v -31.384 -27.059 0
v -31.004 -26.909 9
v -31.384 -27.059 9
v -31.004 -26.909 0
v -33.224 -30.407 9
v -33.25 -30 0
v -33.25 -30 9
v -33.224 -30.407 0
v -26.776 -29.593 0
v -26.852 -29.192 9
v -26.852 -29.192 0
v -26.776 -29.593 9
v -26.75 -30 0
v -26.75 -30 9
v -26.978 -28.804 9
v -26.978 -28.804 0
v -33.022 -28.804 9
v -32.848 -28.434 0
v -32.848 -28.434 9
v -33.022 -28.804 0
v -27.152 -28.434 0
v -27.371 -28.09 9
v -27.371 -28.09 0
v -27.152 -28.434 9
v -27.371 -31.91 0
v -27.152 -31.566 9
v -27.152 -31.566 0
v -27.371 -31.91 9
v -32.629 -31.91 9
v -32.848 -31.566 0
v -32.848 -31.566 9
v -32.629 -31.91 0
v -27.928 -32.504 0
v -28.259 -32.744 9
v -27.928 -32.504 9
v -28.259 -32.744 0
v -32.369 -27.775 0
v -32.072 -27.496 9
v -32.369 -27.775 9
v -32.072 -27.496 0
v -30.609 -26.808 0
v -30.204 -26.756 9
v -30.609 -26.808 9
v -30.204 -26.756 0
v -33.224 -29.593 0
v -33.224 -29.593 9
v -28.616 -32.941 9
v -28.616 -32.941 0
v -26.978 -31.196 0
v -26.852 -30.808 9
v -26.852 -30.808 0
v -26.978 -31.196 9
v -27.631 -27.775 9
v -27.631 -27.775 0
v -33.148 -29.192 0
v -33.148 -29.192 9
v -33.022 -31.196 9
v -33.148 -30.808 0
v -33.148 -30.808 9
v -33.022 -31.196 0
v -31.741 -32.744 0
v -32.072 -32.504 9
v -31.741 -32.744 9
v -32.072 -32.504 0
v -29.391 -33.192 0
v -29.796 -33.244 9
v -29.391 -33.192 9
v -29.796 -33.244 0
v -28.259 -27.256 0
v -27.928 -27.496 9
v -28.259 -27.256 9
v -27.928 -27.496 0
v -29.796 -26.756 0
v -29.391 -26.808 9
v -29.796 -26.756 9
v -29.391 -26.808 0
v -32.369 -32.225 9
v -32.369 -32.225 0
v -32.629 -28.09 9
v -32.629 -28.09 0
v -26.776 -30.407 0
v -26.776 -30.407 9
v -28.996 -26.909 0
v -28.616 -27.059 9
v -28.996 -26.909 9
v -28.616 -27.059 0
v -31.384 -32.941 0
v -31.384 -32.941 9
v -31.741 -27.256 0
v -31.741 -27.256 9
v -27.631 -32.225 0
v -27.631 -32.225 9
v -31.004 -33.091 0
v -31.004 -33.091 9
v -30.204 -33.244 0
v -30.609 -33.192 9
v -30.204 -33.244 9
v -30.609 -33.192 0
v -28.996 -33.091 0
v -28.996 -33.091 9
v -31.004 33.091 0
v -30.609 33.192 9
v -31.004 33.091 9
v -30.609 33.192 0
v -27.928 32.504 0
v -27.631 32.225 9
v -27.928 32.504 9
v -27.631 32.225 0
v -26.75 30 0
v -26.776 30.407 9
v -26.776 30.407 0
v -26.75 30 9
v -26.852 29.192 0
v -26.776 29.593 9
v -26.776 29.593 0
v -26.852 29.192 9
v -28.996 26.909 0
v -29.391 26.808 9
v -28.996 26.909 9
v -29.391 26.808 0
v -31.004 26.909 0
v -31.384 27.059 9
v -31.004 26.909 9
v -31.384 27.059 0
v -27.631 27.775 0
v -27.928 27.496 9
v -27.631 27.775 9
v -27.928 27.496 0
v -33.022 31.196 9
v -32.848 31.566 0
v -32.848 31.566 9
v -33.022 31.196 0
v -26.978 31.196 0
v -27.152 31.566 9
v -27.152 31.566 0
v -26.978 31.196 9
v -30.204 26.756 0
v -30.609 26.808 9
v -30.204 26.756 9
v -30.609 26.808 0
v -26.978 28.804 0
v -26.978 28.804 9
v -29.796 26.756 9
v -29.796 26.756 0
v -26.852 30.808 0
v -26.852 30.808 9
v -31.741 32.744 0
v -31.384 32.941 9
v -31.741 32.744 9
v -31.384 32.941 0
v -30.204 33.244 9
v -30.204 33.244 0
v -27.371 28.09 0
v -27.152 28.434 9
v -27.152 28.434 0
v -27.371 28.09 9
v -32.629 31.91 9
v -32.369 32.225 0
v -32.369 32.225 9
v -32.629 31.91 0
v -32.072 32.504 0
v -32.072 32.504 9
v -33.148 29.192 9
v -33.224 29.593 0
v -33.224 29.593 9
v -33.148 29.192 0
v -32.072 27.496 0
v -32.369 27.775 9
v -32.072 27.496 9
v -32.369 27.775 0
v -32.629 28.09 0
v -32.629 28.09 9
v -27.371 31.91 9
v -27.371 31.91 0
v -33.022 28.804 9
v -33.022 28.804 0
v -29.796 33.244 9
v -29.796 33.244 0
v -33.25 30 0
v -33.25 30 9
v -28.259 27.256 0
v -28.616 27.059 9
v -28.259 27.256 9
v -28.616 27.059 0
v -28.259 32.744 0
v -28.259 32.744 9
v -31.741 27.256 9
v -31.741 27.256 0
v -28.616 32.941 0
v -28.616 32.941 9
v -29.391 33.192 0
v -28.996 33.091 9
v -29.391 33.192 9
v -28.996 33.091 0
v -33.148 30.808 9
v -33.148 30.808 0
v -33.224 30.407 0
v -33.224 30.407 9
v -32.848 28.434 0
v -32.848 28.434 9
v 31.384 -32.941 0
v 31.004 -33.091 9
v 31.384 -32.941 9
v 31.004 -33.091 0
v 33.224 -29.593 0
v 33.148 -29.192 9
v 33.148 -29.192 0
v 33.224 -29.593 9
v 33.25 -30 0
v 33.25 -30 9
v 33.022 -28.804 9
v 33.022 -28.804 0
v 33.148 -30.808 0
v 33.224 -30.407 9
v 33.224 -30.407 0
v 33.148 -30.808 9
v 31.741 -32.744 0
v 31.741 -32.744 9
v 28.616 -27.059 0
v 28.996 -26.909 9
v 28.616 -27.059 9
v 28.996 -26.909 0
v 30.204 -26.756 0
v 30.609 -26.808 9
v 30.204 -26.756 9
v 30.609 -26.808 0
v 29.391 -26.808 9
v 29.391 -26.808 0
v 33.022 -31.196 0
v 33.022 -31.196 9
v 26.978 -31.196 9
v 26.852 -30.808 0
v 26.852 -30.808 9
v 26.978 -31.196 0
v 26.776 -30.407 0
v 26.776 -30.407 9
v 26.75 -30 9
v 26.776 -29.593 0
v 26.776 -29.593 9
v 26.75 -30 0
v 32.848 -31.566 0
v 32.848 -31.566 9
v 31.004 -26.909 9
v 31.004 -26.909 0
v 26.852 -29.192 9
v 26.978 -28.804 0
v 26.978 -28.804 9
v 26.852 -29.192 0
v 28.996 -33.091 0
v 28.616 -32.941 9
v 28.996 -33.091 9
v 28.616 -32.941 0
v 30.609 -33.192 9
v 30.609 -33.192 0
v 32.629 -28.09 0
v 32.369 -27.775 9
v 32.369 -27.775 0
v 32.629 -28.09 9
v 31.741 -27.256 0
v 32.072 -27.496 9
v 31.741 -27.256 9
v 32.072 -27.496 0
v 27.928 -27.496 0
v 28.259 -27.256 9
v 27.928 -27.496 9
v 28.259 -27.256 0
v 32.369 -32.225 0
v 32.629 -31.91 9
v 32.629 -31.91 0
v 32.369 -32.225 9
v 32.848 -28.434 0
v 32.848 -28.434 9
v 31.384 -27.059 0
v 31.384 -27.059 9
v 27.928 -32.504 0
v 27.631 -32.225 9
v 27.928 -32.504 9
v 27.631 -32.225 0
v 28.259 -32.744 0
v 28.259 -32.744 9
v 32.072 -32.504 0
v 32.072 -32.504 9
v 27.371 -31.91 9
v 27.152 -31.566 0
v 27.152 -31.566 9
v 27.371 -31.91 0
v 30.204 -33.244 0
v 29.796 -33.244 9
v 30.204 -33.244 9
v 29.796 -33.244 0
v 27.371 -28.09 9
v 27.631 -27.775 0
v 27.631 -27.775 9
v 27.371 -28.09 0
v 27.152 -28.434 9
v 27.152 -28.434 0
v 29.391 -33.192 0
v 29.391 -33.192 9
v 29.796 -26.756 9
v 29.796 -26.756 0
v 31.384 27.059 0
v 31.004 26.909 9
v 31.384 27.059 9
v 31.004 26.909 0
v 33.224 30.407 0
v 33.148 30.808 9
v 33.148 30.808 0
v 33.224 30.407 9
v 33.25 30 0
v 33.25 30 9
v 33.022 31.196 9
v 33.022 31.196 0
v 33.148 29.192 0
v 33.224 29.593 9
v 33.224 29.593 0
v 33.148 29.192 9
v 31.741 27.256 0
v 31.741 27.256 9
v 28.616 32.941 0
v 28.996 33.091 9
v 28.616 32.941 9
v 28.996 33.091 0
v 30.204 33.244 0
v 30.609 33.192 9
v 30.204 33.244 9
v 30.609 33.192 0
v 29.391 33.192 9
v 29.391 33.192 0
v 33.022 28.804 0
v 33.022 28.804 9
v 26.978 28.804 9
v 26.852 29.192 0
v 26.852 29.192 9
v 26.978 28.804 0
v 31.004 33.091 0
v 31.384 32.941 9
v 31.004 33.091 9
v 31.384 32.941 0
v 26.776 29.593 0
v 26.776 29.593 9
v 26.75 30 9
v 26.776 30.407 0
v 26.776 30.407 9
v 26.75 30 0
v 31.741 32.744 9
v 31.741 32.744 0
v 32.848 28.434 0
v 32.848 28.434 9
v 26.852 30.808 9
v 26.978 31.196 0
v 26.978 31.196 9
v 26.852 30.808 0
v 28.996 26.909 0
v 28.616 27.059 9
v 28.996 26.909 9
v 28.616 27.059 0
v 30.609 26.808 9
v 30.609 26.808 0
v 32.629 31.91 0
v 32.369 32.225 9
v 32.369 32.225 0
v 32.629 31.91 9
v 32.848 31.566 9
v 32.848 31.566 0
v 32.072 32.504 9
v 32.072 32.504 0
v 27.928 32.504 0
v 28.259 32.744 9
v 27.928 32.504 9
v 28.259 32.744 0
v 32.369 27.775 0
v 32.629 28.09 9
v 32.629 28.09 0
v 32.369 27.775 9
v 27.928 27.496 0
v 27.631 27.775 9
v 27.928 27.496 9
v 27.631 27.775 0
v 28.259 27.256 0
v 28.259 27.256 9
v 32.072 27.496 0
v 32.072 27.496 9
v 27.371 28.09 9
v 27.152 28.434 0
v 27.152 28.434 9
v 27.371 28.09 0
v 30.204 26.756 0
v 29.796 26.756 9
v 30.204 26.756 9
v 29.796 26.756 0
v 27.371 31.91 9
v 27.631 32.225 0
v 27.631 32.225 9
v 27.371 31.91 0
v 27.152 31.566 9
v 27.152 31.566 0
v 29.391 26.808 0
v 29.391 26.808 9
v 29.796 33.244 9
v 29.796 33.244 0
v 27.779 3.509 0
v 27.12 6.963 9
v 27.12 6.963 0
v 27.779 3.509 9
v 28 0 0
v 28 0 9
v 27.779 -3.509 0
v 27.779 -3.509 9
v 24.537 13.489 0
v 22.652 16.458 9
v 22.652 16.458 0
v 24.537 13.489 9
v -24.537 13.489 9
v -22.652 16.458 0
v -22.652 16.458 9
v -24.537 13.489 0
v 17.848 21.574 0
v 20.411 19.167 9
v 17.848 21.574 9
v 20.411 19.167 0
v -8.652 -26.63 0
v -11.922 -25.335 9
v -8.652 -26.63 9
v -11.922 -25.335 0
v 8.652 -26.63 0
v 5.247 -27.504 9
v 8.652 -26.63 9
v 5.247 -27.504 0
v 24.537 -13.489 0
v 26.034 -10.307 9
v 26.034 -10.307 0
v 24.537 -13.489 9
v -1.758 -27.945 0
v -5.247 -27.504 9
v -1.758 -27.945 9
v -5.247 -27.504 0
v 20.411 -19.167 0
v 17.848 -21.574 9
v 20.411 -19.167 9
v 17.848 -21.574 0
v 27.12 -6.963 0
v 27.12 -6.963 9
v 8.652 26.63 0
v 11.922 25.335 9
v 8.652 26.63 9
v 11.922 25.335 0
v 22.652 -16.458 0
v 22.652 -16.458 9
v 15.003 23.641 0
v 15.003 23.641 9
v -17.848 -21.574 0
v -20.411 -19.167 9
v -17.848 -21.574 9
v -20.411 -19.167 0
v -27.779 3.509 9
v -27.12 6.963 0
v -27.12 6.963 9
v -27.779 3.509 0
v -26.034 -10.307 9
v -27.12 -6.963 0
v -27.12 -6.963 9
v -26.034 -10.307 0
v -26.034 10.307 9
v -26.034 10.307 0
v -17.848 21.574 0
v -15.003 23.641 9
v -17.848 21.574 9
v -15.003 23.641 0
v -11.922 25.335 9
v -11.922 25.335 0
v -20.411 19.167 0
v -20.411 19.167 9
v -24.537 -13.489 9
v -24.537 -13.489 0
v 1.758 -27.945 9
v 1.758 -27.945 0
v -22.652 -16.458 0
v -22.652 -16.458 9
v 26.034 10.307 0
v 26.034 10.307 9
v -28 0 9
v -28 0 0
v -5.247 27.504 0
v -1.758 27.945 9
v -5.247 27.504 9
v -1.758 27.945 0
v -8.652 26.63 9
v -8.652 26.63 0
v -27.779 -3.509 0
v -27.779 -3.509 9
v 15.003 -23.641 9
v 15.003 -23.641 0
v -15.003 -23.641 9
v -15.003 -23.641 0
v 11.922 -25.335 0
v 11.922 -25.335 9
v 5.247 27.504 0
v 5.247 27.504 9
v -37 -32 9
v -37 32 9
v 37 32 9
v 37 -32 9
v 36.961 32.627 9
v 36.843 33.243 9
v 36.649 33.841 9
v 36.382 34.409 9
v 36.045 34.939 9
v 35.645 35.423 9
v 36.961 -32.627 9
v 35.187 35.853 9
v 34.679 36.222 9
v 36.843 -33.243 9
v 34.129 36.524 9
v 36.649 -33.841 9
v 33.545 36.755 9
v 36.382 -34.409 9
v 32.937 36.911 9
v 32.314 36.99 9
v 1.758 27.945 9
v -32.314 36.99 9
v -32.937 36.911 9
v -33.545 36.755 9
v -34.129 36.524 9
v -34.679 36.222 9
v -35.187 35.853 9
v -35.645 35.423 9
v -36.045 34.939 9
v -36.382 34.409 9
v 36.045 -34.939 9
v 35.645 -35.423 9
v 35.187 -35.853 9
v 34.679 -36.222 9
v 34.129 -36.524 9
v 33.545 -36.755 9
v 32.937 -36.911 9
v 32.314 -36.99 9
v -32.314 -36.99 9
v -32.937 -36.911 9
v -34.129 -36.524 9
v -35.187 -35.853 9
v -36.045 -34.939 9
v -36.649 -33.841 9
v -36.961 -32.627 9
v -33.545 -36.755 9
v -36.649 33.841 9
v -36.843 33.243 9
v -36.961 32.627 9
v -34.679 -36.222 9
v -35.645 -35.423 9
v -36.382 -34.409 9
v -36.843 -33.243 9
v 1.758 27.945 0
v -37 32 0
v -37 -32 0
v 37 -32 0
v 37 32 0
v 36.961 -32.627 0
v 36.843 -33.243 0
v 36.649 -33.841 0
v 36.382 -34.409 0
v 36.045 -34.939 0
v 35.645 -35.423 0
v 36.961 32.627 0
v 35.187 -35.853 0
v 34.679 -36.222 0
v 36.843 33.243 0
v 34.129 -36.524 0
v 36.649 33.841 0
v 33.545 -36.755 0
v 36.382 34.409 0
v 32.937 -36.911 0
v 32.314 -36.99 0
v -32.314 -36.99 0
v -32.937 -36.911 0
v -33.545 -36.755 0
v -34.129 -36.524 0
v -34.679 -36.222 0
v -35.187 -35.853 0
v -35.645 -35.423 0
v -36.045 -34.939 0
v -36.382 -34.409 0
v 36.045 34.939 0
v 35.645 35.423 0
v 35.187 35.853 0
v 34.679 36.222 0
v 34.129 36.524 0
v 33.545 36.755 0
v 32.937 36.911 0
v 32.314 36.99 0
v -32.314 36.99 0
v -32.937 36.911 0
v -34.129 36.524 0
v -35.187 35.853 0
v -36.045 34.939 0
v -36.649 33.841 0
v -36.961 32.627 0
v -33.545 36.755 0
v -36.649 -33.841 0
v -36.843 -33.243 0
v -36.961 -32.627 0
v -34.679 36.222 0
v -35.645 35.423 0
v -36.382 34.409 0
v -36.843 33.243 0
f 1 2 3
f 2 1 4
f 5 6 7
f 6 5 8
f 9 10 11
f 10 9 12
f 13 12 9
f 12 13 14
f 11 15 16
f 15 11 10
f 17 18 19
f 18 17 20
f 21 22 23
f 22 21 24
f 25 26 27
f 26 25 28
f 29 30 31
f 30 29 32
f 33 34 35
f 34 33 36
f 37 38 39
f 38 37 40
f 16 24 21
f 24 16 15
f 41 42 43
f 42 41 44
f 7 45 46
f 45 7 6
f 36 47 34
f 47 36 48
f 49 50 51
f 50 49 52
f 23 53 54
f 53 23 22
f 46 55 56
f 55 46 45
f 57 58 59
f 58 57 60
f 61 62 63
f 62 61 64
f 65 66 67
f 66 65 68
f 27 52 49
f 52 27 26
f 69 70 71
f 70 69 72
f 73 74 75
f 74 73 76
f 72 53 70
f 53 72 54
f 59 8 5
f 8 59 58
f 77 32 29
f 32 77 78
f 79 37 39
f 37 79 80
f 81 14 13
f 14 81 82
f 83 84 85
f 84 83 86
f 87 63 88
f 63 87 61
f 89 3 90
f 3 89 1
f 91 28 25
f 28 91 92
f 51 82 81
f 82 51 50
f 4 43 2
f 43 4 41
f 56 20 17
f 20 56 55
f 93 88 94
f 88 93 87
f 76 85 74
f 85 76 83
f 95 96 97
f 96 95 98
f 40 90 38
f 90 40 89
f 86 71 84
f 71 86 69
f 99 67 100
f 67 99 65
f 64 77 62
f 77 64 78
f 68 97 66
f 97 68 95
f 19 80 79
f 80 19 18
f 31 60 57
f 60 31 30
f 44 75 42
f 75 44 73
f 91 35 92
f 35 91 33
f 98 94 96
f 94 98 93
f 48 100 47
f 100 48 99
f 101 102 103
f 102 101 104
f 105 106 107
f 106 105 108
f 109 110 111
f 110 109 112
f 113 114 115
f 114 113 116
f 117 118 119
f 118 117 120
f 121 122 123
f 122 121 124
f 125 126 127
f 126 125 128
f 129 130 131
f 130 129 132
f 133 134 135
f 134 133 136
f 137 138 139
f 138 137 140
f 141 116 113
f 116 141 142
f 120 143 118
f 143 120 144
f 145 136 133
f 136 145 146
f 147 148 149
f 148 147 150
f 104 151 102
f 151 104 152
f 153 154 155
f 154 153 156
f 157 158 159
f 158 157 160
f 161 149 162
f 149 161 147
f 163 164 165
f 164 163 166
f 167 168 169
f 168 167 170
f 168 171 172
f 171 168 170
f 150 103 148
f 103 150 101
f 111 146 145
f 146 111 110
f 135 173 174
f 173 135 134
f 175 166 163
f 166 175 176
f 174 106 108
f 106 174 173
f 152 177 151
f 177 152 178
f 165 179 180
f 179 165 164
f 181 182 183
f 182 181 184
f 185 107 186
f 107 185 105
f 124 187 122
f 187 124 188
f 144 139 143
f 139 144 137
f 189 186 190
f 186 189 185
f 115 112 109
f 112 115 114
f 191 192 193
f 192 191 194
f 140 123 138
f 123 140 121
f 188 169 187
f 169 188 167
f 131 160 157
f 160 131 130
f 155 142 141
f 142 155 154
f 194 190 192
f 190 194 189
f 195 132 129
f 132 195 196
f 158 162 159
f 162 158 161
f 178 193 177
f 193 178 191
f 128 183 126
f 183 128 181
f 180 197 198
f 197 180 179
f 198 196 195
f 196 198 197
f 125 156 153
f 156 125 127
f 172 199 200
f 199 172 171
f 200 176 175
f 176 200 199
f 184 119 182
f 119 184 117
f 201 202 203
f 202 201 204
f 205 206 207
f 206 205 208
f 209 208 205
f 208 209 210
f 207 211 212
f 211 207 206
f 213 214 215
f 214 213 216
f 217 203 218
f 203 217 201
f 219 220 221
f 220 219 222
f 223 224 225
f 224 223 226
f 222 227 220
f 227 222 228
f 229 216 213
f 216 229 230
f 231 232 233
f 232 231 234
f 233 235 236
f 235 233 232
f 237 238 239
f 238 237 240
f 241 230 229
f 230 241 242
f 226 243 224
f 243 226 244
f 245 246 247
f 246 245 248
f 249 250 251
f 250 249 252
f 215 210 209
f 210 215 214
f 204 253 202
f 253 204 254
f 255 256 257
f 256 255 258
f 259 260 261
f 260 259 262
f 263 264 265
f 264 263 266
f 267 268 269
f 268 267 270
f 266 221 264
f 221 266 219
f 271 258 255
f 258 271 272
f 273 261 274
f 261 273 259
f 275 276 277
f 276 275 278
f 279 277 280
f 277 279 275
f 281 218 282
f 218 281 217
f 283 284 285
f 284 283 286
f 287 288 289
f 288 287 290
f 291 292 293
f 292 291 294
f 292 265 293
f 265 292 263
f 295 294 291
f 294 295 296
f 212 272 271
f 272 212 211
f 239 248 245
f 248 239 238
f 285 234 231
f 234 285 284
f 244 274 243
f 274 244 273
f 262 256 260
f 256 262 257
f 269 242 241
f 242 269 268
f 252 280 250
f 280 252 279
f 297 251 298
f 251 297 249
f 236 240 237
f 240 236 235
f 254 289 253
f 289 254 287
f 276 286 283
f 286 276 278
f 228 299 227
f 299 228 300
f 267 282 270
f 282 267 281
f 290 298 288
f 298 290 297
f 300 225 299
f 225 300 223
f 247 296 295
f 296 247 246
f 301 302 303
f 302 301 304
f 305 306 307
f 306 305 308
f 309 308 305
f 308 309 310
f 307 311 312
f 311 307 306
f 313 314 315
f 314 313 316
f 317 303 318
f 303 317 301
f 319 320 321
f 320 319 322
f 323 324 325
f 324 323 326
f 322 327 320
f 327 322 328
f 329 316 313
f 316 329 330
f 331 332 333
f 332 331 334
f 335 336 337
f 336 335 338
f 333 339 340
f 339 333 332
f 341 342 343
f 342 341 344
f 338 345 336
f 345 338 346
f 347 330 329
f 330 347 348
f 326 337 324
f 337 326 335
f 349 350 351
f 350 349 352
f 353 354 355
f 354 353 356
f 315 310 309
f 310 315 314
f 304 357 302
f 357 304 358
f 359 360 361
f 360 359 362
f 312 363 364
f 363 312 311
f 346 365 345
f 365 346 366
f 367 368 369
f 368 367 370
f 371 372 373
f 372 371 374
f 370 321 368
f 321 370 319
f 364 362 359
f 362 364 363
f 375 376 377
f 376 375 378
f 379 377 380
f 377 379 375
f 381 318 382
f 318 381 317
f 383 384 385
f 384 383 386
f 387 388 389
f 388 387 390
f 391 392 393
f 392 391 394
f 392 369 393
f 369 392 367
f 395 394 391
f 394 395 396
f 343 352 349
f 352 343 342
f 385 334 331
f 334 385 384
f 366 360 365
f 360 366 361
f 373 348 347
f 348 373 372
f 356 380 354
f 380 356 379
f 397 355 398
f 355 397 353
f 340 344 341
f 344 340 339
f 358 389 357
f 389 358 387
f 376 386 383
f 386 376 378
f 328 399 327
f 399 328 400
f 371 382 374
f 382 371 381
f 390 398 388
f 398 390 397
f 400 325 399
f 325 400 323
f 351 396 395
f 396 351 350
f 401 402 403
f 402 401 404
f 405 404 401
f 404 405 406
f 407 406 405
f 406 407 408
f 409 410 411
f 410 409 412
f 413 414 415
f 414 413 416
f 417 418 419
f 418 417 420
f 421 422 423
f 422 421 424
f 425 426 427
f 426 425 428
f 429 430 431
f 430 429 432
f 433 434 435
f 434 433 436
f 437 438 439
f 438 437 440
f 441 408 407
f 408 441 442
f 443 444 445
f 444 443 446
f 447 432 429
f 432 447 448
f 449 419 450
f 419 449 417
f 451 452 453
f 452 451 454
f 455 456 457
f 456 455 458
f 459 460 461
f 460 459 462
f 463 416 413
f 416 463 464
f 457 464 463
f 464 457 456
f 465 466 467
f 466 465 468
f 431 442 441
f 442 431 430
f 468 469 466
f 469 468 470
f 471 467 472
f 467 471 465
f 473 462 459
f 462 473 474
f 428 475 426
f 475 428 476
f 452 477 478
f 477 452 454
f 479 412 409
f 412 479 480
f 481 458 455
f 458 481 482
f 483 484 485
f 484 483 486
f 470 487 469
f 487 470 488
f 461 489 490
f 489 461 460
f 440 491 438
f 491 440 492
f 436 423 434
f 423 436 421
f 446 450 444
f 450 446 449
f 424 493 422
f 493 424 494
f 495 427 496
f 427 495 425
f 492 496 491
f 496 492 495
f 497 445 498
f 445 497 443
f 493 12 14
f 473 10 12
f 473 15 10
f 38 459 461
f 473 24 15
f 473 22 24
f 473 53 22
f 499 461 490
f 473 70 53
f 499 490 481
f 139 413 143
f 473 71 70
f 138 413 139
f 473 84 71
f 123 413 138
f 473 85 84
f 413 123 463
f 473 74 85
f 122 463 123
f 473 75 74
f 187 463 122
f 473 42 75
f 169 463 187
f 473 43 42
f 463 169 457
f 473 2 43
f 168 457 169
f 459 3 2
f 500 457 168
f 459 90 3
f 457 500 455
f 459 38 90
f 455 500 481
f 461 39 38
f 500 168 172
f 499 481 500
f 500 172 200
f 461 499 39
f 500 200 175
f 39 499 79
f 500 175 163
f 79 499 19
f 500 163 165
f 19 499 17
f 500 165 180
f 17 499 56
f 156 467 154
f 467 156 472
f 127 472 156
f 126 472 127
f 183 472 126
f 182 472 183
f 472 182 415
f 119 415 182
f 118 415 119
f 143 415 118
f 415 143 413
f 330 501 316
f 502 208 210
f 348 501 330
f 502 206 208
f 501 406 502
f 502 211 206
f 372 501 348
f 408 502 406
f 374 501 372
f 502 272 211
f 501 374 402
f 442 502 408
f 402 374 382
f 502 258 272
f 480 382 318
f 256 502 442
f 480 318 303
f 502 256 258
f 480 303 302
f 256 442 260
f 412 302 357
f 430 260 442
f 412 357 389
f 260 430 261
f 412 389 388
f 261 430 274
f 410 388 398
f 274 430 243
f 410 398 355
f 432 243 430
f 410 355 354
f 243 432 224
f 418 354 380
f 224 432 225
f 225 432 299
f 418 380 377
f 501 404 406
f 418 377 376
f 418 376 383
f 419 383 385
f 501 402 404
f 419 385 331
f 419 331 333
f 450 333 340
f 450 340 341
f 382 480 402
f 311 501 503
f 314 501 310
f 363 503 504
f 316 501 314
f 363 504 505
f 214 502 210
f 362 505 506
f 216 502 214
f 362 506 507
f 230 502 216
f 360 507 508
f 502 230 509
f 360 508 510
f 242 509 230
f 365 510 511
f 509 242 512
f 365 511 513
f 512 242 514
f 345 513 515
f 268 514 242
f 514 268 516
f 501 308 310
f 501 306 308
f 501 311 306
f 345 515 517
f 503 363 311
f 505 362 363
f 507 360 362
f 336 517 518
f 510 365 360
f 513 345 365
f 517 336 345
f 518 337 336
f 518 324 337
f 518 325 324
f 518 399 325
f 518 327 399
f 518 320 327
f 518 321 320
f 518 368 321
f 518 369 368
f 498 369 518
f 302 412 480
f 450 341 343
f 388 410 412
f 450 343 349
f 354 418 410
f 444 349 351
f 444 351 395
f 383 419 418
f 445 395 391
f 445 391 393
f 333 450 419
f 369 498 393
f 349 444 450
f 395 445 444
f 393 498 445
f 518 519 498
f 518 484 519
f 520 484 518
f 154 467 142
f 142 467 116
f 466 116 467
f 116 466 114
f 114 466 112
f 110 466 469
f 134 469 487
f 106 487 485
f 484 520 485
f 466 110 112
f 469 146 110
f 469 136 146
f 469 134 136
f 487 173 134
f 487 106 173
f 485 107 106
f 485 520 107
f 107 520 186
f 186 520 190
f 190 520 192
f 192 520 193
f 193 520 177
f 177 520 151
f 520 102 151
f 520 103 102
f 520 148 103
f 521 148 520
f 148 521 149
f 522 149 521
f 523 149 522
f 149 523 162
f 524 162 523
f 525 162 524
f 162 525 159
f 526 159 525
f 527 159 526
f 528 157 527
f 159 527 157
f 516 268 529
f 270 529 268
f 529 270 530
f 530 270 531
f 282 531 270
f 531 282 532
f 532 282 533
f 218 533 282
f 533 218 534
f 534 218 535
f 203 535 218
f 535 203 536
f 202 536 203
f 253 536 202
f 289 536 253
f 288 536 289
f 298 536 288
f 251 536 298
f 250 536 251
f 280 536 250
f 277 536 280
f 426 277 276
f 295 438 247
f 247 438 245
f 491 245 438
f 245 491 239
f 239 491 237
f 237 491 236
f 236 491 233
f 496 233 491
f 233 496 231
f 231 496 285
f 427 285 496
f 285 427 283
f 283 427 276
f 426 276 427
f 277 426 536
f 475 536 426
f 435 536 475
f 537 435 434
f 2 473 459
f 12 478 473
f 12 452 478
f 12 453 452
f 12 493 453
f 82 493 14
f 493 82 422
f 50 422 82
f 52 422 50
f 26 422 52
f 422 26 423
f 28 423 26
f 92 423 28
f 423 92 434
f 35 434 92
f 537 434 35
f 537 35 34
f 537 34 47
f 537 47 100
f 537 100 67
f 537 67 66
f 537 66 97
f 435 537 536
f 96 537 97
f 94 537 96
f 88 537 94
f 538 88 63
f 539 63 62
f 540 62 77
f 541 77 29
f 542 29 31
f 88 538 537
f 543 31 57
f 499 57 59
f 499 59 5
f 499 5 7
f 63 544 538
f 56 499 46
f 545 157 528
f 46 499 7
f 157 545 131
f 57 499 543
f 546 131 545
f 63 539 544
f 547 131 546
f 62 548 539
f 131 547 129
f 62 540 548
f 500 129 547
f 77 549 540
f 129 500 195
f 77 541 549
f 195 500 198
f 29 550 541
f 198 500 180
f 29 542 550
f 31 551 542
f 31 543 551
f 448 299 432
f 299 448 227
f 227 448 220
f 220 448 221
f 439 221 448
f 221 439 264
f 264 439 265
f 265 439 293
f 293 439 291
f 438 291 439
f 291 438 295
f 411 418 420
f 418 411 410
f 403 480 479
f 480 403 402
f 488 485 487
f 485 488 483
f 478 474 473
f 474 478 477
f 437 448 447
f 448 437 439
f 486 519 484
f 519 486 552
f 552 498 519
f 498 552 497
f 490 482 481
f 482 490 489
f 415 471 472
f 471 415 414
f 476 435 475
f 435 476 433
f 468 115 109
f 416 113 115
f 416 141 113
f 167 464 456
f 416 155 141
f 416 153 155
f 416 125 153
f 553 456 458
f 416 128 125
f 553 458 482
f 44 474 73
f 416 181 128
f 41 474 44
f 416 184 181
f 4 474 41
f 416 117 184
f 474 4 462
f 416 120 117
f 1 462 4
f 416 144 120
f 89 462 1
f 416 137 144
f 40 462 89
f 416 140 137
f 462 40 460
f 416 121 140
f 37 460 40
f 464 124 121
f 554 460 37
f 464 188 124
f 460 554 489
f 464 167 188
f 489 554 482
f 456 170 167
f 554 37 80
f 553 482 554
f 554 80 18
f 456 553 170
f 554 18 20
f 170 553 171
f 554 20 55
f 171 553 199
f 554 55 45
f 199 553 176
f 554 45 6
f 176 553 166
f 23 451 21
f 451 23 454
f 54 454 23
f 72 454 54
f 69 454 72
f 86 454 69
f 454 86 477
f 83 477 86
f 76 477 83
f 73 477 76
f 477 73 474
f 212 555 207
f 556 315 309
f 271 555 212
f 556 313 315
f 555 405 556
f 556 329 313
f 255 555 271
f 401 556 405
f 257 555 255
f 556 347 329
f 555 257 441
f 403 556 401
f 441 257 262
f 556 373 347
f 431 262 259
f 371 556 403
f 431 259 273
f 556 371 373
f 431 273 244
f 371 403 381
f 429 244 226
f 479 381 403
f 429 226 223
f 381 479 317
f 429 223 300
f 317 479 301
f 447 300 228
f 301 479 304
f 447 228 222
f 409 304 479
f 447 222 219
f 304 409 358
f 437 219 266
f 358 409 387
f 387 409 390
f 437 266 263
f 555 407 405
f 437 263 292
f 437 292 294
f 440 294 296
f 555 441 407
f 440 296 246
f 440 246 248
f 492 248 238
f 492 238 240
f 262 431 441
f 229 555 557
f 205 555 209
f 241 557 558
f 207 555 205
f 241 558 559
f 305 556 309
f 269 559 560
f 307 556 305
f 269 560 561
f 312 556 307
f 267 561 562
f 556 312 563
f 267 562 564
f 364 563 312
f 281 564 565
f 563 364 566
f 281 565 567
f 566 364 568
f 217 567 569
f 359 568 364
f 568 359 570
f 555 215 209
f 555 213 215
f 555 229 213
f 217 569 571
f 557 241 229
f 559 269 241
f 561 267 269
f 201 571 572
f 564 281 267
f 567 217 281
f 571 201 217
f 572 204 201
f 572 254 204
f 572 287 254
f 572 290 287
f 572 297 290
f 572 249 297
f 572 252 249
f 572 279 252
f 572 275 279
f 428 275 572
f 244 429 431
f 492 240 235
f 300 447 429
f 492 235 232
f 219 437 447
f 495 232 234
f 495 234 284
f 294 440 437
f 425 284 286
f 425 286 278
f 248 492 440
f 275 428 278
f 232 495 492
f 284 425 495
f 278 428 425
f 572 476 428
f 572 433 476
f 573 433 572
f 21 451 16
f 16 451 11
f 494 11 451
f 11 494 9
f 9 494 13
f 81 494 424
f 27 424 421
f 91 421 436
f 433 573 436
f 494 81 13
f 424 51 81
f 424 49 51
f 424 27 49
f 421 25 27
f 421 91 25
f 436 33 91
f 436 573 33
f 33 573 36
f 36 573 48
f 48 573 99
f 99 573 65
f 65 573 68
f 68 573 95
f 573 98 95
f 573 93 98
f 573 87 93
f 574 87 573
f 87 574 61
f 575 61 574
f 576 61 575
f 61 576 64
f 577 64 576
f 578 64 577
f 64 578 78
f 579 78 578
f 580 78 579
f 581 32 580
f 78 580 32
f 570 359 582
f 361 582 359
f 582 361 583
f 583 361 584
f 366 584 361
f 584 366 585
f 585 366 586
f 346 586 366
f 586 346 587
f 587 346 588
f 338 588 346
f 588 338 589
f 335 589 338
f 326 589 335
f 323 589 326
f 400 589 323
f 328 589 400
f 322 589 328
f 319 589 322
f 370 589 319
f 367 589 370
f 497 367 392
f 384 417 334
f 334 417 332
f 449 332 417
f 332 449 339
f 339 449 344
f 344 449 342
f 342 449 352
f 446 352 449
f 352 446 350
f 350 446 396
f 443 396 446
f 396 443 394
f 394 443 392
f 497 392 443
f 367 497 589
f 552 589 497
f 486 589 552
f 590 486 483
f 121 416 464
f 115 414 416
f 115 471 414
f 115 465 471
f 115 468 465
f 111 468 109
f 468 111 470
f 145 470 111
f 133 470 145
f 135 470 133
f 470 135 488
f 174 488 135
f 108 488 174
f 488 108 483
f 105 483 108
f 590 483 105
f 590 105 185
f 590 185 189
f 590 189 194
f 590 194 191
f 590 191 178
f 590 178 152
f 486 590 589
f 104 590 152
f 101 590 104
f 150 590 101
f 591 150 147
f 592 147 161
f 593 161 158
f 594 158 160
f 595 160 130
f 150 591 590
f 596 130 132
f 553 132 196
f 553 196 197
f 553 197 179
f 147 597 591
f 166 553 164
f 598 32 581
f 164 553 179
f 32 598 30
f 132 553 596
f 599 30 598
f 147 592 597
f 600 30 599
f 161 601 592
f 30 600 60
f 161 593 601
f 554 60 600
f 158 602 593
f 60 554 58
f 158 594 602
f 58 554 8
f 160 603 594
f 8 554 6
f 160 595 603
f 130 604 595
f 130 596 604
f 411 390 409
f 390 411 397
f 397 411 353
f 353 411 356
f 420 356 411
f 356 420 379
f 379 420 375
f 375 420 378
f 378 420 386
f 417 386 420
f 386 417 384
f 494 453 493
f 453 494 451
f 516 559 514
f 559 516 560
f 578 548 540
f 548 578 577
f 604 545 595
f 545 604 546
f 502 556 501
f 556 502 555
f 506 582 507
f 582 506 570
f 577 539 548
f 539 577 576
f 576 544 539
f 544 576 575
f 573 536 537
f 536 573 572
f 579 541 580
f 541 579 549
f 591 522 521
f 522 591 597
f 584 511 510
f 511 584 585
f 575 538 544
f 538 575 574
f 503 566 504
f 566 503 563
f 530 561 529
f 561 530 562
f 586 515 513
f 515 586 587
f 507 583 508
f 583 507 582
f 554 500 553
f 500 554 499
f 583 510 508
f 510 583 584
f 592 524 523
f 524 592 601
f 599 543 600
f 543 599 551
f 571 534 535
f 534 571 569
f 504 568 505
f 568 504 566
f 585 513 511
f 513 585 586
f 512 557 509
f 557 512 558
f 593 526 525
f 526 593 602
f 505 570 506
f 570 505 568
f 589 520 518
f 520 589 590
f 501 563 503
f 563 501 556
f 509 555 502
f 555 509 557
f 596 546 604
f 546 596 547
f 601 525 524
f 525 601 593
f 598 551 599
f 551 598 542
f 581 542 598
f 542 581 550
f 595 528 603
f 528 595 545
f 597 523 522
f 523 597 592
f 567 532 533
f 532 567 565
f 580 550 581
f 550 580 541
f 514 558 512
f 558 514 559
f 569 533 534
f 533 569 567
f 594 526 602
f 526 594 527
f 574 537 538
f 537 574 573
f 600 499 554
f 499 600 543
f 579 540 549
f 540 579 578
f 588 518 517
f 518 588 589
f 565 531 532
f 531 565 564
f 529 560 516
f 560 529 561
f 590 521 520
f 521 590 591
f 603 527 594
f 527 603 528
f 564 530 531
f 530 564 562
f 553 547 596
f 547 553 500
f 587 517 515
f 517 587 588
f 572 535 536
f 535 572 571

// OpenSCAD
$fn = 50;


difference() {
	union() {
		hull() {
			translate(v = [-32.0000000000, 32.0000000000, 0]) {
				cylinder(h = 9, r = 5);
			}
			translate(v = [32.0000000000, 32.0000000000, 0]) {
				cylinder(h = 9, r = 5);
			}
			translate(v = [-32.0000000000, -32.0000000000, 0]) {
				cylinder(h = 9, r = 5);
			}
			translate(v = [32.0000000000, -32.0000000000, 0]) {
				cylinder(h = 9, r = 5);
			}
		}
	}
	union() {
		#translate(v = [-30.0000000000, -30.0000000000, -100.0000000000]) {
			cylinder(h = 200, r = 3.2500000000);
		}
		#translate(v = [-30.0000000000, 30.0000000000, -100.0000000000]) {
			cylinder(h = 200, r = 3.2500000000);
		}
		#translate(v = [30.0000000000, -30.0000000000, -100.0000000000]) {
			cylinder(h = 200, r = 3.2500000000);
		}
		#translate(v = [30.0000000000, 30.0000000000, -100.0000000000]) {
			cylinder(h = 200, r = 3.2500000000);
		}
		#cylinder(h = 9, r = 28.0000000000);
	}
}
